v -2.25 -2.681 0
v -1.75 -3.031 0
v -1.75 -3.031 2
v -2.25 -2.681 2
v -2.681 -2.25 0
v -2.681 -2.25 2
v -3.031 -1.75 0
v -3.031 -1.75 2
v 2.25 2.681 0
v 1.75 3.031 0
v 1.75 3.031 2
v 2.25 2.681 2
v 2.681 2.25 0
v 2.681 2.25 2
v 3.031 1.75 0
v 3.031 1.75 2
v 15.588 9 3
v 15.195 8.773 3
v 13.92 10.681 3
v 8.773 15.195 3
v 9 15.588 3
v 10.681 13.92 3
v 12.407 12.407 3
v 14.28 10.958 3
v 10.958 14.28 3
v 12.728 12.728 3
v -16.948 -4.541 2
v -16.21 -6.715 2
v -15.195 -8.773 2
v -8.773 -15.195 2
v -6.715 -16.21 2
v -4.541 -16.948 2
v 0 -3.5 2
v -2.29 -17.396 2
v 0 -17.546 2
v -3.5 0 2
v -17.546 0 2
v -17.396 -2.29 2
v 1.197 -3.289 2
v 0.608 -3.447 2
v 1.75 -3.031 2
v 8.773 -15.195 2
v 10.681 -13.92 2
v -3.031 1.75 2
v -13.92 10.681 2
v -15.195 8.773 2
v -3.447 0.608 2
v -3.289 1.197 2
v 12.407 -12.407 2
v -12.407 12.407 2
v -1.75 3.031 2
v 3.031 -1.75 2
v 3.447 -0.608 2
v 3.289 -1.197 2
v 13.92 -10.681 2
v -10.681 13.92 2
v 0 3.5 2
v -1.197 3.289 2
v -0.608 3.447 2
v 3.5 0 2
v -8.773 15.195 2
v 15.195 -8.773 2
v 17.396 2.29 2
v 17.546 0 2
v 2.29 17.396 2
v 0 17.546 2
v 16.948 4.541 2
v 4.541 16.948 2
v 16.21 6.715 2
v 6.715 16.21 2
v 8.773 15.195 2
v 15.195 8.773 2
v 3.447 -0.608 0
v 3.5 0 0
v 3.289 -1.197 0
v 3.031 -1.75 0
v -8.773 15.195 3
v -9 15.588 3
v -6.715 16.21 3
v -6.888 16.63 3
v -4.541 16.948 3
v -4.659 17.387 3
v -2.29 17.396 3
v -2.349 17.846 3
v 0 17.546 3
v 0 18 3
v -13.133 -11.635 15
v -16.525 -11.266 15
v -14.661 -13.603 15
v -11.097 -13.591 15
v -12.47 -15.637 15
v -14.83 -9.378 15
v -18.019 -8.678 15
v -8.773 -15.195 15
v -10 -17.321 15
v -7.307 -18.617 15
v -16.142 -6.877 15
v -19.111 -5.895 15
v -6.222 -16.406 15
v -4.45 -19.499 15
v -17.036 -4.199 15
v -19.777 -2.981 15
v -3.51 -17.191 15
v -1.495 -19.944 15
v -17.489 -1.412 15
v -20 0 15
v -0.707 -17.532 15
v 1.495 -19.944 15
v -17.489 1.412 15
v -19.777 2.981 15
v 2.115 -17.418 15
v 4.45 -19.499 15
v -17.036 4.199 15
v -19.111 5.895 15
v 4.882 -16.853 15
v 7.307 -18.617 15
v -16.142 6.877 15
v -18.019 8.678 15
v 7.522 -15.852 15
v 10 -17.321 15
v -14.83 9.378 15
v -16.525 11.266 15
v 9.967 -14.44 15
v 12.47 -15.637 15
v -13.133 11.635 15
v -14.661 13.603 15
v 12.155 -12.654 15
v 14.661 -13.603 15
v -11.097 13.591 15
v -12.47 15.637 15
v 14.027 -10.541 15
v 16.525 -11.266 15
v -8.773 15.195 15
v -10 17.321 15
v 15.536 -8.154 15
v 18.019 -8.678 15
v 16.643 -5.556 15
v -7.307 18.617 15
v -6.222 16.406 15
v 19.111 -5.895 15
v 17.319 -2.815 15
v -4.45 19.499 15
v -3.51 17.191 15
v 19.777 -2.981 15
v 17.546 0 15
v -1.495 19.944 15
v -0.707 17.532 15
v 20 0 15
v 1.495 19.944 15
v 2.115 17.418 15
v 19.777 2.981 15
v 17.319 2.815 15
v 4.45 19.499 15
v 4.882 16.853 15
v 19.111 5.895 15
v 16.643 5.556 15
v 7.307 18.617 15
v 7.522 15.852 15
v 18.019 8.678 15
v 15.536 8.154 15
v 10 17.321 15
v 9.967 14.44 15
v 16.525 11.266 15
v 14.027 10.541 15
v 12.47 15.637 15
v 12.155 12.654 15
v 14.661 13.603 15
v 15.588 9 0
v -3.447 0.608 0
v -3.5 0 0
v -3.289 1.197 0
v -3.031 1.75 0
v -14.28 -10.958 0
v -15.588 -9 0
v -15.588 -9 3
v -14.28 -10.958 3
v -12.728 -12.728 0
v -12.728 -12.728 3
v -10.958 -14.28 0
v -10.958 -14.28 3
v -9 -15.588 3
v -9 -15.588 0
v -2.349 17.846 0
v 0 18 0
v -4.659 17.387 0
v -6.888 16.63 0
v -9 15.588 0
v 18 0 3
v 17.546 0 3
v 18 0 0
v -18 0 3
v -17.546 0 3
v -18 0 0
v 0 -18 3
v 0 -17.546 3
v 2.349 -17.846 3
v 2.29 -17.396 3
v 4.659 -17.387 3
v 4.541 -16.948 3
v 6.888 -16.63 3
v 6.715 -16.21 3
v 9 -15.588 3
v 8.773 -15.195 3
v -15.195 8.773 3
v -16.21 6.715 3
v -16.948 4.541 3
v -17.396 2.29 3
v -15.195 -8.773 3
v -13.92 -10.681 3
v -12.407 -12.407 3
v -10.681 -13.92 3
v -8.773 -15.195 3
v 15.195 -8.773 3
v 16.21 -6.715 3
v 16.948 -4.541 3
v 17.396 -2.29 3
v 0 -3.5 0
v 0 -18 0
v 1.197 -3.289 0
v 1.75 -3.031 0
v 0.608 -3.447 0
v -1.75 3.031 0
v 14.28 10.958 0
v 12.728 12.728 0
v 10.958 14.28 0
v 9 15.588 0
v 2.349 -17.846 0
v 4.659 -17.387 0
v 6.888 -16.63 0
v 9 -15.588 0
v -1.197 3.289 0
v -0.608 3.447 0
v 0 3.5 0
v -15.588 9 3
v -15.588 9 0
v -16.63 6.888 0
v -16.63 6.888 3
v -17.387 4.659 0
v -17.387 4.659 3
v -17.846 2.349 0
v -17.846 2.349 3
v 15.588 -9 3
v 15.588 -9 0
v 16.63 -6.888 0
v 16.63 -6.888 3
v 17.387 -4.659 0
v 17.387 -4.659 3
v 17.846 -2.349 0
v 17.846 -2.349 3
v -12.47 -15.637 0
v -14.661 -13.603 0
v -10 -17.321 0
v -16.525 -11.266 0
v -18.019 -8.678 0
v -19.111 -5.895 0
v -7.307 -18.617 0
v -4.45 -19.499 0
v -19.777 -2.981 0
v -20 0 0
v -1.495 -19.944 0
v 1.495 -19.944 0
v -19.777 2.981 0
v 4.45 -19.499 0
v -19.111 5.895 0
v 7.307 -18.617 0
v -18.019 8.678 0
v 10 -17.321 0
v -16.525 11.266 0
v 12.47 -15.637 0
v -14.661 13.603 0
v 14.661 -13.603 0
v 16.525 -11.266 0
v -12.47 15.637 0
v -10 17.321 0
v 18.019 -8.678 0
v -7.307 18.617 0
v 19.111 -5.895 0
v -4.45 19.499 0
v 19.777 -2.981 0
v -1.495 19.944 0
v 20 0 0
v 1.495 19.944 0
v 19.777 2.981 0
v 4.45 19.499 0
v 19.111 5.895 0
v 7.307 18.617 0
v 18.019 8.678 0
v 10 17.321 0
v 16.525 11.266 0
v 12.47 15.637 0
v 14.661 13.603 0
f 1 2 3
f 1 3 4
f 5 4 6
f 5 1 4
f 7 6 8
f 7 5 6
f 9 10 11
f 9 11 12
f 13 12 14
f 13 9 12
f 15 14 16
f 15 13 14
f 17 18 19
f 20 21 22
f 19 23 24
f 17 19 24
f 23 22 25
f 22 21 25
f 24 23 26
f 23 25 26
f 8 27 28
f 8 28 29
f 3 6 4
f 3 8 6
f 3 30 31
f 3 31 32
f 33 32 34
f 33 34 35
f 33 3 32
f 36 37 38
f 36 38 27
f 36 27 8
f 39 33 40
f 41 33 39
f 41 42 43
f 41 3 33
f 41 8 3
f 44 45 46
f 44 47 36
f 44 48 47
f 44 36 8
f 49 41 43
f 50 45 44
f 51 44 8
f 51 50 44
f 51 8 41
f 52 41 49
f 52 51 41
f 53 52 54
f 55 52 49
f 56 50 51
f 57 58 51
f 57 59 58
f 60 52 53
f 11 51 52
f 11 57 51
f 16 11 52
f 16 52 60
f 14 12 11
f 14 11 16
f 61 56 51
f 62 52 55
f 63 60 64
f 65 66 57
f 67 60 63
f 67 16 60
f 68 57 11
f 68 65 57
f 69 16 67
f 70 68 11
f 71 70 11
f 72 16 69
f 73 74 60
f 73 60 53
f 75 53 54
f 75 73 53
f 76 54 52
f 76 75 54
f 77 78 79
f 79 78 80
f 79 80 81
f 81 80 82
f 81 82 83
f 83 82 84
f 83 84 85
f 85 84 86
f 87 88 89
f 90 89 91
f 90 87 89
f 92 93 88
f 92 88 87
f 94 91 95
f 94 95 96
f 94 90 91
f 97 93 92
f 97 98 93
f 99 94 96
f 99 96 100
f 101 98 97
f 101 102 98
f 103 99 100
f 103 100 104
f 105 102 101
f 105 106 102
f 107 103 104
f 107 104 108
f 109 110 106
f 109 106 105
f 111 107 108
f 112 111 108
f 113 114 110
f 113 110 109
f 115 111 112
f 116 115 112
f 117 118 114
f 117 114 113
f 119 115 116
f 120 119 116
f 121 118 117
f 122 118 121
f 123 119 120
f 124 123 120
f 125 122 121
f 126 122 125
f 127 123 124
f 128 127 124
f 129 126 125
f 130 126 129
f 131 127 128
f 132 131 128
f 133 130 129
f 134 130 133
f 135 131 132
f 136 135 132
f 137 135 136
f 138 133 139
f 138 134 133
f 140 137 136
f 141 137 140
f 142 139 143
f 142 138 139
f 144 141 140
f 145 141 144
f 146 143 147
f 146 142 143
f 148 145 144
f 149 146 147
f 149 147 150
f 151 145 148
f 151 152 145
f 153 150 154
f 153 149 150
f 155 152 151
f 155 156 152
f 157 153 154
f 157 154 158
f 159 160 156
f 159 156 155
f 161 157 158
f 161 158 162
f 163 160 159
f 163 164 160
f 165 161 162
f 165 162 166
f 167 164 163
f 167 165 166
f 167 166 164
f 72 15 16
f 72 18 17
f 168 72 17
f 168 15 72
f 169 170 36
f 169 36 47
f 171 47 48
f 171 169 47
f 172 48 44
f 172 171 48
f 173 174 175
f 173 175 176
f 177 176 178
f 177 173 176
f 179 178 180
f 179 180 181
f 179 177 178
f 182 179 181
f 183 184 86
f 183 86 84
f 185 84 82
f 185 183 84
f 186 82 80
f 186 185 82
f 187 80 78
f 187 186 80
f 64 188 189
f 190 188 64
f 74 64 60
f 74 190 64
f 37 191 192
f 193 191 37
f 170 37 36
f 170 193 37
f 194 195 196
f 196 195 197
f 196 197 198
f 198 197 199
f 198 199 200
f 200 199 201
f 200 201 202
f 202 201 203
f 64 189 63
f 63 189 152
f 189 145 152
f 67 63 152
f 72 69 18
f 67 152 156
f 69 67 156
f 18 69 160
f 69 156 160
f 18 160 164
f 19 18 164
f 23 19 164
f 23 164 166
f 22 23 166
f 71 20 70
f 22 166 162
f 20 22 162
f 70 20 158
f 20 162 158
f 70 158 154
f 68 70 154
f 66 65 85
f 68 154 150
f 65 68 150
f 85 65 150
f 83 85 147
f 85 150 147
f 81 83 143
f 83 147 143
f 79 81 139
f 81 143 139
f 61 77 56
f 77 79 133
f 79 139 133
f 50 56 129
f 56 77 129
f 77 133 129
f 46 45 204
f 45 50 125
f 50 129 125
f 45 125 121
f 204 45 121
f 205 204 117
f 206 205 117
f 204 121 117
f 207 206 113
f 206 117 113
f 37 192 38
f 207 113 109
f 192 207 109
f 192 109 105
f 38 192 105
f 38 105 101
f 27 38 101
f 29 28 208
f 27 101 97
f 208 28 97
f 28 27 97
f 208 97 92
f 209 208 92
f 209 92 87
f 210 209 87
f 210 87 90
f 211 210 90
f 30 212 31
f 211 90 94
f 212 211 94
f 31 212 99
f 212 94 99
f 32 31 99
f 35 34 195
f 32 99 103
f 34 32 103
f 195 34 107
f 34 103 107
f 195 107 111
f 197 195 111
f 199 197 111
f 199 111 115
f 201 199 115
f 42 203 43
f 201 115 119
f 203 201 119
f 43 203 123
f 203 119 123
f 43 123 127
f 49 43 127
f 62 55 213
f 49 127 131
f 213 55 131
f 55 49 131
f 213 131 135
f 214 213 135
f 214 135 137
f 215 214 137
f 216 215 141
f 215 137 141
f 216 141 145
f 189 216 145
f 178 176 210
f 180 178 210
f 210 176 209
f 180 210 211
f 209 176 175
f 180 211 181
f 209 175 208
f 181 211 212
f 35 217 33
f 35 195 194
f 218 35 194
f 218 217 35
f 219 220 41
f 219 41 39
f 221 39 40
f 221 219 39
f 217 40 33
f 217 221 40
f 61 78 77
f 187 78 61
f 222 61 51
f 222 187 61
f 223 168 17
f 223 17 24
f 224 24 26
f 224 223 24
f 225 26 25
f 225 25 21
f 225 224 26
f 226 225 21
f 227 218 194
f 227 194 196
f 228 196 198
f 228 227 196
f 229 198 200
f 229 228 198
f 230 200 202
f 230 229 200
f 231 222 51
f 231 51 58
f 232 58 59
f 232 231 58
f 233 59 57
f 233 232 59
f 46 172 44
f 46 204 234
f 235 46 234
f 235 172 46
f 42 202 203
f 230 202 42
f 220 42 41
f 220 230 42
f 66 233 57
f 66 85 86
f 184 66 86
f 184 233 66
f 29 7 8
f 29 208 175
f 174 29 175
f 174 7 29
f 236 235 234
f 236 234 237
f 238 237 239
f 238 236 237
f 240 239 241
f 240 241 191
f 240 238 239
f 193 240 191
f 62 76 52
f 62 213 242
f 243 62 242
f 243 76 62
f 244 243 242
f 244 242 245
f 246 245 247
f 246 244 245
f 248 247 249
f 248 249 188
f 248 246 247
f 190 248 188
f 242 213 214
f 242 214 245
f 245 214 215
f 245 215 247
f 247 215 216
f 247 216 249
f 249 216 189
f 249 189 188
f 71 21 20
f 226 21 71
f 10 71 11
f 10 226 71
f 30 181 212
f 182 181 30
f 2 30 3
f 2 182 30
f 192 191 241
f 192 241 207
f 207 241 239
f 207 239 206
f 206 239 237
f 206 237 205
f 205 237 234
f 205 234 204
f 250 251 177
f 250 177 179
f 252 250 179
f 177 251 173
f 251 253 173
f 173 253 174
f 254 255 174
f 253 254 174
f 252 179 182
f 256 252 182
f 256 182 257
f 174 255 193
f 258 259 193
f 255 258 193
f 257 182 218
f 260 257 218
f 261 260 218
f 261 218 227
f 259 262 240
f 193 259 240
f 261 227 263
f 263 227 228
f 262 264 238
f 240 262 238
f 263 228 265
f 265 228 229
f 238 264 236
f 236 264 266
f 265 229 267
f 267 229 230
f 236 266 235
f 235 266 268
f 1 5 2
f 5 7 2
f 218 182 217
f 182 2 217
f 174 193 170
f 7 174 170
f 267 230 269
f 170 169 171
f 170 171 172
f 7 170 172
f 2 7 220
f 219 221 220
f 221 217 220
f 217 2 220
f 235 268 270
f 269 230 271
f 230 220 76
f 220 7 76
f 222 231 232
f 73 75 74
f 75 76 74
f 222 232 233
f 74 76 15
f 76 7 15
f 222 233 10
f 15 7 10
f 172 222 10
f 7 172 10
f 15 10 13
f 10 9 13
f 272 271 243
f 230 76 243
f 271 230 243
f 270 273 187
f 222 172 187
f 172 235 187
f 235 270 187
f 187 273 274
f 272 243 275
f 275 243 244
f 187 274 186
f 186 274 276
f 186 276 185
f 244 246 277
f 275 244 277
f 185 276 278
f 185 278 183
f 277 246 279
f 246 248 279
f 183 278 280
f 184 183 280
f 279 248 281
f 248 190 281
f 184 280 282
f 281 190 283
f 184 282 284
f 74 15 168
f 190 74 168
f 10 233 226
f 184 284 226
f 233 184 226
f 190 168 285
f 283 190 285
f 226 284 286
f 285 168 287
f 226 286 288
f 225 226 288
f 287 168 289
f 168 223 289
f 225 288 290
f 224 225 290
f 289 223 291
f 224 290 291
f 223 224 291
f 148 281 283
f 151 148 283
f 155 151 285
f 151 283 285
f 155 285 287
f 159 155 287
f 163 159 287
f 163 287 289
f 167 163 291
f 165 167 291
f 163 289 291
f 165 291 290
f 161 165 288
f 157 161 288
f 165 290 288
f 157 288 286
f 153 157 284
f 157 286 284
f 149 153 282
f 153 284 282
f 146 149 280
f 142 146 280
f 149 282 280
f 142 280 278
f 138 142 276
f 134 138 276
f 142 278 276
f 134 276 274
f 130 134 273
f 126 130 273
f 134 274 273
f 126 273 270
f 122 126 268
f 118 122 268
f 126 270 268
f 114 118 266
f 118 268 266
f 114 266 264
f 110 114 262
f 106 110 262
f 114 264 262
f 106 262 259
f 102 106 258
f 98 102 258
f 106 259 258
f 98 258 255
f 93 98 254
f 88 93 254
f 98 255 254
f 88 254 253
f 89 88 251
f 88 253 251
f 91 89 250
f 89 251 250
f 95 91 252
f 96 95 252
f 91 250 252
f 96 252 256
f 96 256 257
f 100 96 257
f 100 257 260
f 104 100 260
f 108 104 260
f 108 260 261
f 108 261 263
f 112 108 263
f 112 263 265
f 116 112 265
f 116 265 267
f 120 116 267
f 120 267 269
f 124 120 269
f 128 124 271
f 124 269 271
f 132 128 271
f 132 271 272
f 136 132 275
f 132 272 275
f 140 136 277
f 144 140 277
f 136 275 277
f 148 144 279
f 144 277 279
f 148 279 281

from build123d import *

# Parameters (mm, degrees)
F0_R     = 20
F1_DEPTH = 15
F2_R     = 17.5460358756
F4_DEPTH = 13
F6_DEPTH = 3


# Not quite as in the source:
# - a feature of the source that left no trace in its solid (it failed there, or was rolled back) is left out


with BuildPart() as f1:
    # F0 (on Top) → F1 (new body)
    with BuildSketch(Plane.XY):
        Circle(F0_R)
    extrude(amount=F1_DEPTH)

    # F2 (on face) → F4 (cut)
    with BuildSketch(Plane.XY.offset(15)):
        Circle(F2_R)
    extrude(amount=-F4_DEPTH, mode=Mode.SUBTRACT)

    # F5 (on face) → F6 (cut)
    with BuildSketch(Plane.XY):
        with BuildLine():
            ThreePointArc((0, -18), (4.6587428118, -17.3866648732), (9, -15.5884572681))
            Line((9, -15.5884572681), (1.75, -3.0310889132))
            ThreePointArc((1.75, -3.0310889132), (0.9058666579, -3.380740392), (0, -3.5))
            Line((0, -3.5), (0, -18))
        make_face()
        with BuildLine():
            ThreePointArc((15.5884572681, -9), (17.3866648732, -4.6587428118), (18, 0))
            Line((18, 0), (3.5, 0))
            ThreePointArc((3.5, 0), (3.380740392, -0.9058666579), (3.0310889132, -1.75))
            Line((3.0310889132, -1.75), (15.5884572681, -9))
        make_face()
        with BuildLine():
            Line((3.0310889132, 1.75), (15.5884572681, 9))
            ThreePointArc((15.5884572681, 9), (12.7279220614, 12.7279220614), (9, 15.5884572681))
            Line((9, 15.5884572681), (1.75, 3.0310889132))
            ThreePointArc((1.75, 3.0310889132), (2.4748737342, 2.4748737342), (3.0310889132, 1.75))
        make_face()
        with BuildLine():
            Line((0, 3.5), (0, 18))
            ThreePointArc((0, 18), (-4.6587428118, 17.3866648732), (-9, 15.5884572681))
            Line((-9, 15.5884572681), (-1.75, 3.0310889132))
            ThreePointArc((-1.75, 3.0310889132), (-0.9058666579, 3.380740392), (0, 3.5))
        make_face()
        with BuildLine():
            Line((-3.0310889132, 1.75), (-15.5884572681, 9))
            ThreePointArc((-15.5884572681, 9), (-17.3866648732, 4.6587428118), (-18, 0))
            Line((-18, 0), (-3.5, 0))
            ThreePointArc((-3.5, 0), (-3.380740392, 0.9058666579), (-3.0310889132, 1.75))
        make_face()
        with BuildLine():
            ThreePointArc((-15.5884572681, -9), (-12.7279220614, -12.7279220614), (-9, -15.5884572681))
            Line((-9, -15.5884572681), (-1.75, -3.0310889132))
            ThreePointArc((-1.75, -3.0310889132), (-2.4748737342, -2.4748737342), (-3.0310889132, -1.75))
            Line((-3.0310889132, -1.75), (-15.5884572681, -9))
        make_face()
    extrude(amount=F6_DEPTH, mode=Mode.SUBTRACT)


solid = f1.part
